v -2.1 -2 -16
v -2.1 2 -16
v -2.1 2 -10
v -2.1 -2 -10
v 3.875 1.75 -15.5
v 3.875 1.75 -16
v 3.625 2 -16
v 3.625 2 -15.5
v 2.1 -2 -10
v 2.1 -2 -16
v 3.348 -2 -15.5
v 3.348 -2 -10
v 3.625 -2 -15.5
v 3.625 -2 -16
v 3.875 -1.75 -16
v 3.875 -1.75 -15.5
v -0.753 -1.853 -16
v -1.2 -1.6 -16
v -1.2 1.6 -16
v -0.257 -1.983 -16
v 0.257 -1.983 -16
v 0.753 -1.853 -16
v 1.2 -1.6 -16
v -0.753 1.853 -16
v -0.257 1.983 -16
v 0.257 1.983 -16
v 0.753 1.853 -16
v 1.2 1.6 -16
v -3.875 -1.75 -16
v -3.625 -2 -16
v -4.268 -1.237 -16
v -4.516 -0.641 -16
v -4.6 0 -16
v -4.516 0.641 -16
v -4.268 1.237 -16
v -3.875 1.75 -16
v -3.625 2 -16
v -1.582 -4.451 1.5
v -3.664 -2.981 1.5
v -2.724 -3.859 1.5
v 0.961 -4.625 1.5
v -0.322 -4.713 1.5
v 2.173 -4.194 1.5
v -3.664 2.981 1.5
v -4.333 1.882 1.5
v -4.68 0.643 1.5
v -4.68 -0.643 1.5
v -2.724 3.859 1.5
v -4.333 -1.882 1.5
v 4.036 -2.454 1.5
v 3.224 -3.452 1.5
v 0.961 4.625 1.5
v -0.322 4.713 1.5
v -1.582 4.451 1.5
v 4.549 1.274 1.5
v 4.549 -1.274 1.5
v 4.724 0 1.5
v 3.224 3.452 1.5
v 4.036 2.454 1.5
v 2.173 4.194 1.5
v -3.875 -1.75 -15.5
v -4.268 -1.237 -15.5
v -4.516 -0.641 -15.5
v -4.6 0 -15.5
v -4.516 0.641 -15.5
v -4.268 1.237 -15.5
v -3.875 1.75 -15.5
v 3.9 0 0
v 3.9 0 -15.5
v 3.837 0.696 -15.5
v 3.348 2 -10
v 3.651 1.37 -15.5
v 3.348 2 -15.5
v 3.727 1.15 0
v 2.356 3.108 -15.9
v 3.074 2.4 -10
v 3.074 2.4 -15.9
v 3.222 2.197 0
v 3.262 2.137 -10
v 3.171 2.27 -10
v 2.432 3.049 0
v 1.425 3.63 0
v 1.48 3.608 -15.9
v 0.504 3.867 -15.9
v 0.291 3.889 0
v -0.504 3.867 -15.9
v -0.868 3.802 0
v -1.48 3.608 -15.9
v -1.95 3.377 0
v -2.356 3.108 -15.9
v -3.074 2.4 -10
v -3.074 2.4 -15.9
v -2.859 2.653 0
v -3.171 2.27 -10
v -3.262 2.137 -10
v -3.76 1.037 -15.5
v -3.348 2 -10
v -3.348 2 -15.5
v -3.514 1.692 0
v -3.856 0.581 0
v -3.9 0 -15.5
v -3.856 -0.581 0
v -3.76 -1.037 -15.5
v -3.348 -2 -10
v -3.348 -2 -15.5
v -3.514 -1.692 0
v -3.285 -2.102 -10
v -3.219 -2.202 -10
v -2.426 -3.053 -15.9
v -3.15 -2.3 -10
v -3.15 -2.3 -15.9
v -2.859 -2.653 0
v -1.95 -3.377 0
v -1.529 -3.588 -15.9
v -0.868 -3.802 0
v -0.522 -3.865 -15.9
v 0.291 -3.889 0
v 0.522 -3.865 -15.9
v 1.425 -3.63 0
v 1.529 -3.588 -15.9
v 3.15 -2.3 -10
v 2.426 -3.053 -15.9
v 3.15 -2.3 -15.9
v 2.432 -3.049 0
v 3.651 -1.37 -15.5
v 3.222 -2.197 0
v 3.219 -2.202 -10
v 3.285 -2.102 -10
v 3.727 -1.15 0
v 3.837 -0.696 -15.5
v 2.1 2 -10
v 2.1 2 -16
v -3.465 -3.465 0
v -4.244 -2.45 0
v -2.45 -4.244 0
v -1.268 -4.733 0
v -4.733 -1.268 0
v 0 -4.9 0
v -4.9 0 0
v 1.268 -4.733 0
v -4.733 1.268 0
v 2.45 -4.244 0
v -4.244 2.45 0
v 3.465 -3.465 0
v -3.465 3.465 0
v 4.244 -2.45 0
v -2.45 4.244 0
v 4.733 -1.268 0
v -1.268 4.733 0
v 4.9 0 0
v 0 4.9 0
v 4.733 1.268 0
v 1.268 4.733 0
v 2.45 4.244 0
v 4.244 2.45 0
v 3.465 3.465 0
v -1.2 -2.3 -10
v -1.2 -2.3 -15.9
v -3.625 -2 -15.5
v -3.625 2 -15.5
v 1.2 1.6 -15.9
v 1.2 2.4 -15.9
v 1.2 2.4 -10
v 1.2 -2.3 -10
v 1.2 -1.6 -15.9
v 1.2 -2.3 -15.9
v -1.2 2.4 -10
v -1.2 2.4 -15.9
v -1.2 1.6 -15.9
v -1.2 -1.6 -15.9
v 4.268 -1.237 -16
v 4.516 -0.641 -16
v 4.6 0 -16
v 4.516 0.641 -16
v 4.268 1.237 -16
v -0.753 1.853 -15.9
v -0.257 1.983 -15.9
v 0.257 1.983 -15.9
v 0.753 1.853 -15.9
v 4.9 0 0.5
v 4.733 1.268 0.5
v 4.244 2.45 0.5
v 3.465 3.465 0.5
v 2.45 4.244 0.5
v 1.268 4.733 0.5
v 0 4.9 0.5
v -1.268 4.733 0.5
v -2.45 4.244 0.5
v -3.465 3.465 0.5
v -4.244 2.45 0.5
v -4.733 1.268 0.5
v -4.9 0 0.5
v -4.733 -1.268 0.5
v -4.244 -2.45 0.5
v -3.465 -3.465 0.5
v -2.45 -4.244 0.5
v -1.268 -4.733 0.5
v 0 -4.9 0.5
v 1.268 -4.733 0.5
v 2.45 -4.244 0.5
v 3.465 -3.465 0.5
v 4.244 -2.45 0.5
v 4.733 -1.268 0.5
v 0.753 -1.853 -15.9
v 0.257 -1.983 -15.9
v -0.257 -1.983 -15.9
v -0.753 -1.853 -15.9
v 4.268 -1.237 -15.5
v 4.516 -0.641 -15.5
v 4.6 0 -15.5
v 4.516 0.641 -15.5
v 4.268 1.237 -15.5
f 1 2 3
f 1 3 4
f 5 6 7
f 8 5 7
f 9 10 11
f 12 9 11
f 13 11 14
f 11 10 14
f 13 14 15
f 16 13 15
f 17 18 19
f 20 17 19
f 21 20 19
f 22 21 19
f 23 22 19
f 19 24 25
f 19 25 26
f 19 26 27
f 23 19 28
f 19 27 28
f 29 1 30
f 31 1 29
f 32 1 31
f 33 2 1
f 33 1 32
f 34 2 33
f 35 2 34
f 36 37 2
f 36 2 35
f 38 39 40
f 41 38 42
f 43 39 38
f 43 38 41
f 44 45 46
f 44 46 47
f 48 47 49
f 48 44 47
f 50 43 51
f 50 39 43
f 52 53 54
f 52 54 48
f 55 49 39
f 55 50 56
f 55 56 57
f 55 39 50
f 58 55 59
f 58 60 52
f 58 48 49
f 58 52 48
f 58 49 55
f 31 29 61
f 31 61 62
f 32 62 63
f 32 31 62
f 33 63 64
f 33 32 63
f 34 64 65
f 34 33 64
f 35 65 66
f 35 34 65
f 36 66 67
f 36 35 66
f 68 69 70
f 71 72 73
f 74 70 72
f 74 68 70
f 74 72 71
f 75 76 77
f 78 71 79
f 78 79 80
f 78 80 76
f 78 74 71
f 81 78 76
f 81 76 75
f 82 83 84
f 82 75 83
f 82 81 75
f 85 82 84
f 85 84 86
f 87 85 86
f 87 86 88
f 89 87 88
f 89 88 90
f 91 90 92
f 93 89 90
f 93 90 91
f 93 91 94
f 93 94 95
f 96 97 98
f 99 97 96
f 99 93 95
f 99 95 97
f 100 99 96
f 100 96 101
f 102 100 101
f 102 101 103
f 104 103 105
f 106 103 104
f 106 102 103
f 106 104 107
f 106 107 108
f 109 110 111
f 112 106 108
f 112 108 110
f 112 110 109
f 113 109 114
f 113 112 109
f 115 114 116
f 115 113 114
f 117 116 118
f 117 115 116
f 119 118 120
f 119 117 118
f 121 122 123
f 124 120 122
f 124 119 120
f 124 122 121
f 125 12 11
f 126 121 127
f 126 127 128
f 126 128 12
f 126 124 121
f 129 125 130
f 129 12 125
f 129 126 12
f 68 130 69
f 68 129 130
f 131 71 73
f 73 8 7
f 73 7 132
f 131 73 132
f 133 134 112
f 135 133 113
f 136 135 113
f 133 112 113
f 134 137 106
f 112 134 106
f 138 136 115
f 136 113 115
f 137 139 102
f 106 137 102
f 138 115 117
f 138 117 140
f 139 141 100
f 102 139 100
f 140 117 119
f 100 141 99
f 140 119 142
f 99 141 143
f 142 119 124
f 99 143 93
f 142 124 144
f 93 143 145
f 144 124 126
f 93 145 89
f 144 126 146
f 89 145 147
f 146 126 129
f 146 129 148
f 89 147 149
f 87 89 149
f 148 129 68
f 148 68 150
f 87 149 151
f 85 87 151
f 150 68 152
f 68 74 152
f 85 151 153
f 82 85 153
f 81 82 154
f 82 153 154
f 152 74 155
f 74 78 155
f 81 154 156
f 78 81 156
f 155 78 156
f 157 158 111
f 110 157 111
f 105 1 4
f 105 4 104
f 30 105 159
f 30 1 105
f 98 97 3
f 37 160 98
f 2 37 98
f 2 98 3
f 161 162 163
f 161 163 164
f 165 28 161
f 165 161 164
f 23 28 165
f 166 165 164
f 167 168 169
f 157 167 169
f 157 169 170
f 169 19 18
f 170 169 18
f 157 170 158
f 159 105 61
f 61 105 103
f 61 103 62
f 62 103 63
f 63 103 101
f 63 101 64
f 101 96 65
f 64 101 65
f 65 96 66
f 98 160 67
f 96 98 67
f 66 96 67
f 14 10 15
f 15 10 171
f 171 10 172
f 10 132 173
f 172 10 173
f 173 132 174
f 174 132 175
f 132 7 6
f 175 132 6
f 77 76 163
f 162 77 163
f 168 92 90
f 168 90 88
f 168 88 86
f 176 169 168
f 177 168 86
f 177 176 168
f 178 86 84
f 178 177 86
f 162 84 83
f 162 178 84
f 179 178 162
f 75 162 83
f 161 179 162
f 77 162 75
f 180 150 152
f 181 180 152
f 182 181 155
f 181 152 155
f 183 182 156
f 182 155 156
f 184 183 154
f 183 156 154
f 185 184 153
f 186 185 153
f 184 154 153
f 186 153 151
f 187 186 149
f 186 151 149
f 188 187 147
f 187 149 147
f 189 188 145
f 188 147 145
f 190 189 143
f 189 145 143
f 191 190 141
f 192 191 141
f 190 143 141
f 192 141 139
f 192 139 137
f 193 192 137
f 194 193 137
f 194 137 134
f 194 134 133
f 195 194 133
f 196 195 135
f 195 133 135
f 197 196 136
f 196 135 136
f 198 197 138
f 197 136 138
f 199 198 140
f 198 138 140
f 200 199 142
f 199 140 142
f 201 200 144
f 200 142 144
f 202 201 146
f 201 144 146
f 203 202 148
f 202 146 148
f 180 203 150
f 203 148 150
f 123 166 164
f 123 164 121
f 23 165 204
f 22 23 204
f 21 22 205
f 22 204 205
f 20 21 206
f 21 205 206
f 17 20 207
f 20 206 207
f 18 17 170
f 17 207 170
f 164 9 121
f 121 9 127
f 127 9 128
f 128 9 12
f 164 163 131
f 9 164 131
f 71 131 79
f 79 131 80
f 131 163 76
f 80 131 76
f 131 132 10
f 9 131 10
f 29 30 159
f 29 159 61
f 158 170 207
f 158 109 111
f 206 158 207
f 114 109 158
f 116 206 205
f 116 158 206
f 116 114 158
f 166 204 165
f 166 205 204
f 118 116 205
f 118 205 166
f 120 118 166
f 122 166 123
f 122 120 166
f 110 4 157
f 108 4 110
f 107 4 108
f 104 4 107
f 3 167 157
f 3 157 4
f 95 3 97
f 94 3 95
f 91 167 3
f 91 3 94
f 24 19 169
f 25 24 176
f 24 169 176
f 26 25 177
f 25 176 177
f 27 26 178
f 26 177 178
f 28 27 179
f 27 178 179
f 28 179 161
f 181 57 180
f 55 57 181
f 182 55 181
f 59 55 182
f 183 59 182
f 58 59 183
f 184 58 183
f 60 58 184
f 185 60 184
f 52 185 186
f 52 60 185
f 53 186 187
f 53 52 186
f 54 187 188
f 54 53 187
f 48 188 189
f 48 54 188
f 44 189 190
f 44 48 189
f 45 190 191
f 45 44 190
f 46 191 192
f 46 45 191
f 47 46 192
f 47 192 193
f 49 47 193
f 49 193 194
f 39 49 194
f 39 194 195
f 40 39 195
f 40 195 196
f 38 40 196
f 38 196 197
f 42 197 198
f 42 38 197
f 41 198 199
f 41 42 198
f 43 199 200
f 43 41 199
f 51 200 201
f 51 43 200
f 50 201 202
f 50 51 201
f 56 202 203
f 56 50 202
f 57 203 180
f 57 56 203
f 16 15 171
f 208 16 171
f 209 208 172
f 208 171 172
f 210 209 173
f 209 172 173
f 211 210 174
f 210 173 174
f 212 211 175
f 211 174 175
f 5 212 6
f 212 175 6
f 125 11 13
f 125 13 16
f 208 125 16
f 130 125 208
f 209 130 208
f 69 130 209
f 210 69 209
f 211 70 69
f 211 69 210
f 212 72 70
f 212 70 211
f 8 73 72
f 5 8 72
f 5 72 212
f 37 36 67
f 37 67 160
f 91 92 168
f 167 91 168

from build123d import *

# Parameters (mm, degrees)
SKETCH1_R           = 3.9
BOSS_EXTRUDE1_DEPTH = 16
SKETCH1_3_R         = 4.9
BOSS_EXTRUDE2_DEPTH = 1.5
CUT_EXTRUDE2_START  = 15.9
SKETCH5_R           = 3.9
SKETCH5_R_2         = 2
CUT_EXTRUDE2_DEPTH  = 3.2
CHAMFER1_SIZE       = 1
CHAMFER1_SIZE2      = 0.176326981
BOSS_EXTRUDE3_DEPTH = 0.5
CUT_EXTRUDE1_DEPTH  = 6


with BuildPart() as part:
    # Sketch1 → Boss-Extrude1 (new body)
    with BuildSketch(Plane.XY):
        Circle(SKETCH1_R)
    extrude(amount=-BOSS_EXTRUDE1_DEPTH)

    # Sketch1<3> → Boss-Extrude2 (add)
    with BuildSketch(Plane.XY):
        Circle(SKETCH1_3_R)
    extrude(amount=BOSS_EXTRUDE2_DEPTH)

    # Sketch5 → Cut-Extrude2 (cut)
    with BuildSketch(Plane(origin=(0, 0, 0), x_dir=(-1, 0, 0), z_dir=(0, 0, -1)).offset(CUT_EXTRUDE2_START)):
        Circle(SKETCH5_R)
        Circle(SKETCH5_R_2, mode=Mode.SUBTRACT)
    extrude(amount=CUT_EXTRUDE2_DEPTH, mode=Mode.SUBTRACT)

    # Chamfer1
    chamfer1_edges = [part.edges().sort_by_distance(p)[0] for p in [
        (-4.9, 0, 1.5),
    ]]
    chamfer1_side = [part.faces().sort_by_distance(p)[0] for p in [
        (-4.9, 0, 0.75),
    ]]
    chamfer(chamfer1_edges, length=CHAMFER1_SIZE, length2=CHAMFER1_SIZE2, reference=chamfer1_side[0])

    # Sketch2 → Boss-Extrude3 (add)
    with BuildSketch(Plane(origin=(0, 0, -16), x_dir=(-1, 0, 0), z_dir=(0, 0, -1))):
        with BuildLine():
            Line((-3.625126266, 2), (-2.1, 2))
            Line((-2.1, 2), (-2.1, -2))
            Line((-2.1, -2), (-3.625126266, -2))
            Line((-3.625126266, -2), (-3.875126266, -1.75))
            ThreePointArc((-3.875126266, -1.75), (-4.6, 0), (-3.875126266, 1.75))
            Line((-3.875126266, 1.75), (-3.625126266, 2))
        make_face()
    boss_extrude3 = extrude(amount=-BOSS_EXTRUDE3_DEPTH)

    # Sketch4 → Cut-Extrude1 (cut)
    with BuildSketch(Plane(origin=(0, 0, -16), x_dir=(-1, 0, 0), z_dir=(0, 0, -1))):
        Polygon((-3.625126266, -2), (-2.1, -2), (-2.1, 2), (-3.625126266, 2), (-3.625126266, 2.4), (-1.2, 2.4), (-1.2, -2.3), (-3.625126266, -2.3), align=None)
    cut_extrude1 = extrude(amount=-CUT_EXTRUDE1_DEPTH, mode=Mode.SUBTRACT)

    # Mirror1: Boss-Extrude3, Cut-Extrude1 across plane
    add(boss_extrude3.mirror(Plane(origin=(0, 0, 0), x_dir=(0, 0, 1), z_dir=(1, 0, 0))))
    add(cut_extrude1.mirror(Plane(origin=(0, 0, 0), x_dir=(0, 0, 1), z_dir=(1, 0, 0))), mode=Mode.SUBTRACT)


solid = part.part
